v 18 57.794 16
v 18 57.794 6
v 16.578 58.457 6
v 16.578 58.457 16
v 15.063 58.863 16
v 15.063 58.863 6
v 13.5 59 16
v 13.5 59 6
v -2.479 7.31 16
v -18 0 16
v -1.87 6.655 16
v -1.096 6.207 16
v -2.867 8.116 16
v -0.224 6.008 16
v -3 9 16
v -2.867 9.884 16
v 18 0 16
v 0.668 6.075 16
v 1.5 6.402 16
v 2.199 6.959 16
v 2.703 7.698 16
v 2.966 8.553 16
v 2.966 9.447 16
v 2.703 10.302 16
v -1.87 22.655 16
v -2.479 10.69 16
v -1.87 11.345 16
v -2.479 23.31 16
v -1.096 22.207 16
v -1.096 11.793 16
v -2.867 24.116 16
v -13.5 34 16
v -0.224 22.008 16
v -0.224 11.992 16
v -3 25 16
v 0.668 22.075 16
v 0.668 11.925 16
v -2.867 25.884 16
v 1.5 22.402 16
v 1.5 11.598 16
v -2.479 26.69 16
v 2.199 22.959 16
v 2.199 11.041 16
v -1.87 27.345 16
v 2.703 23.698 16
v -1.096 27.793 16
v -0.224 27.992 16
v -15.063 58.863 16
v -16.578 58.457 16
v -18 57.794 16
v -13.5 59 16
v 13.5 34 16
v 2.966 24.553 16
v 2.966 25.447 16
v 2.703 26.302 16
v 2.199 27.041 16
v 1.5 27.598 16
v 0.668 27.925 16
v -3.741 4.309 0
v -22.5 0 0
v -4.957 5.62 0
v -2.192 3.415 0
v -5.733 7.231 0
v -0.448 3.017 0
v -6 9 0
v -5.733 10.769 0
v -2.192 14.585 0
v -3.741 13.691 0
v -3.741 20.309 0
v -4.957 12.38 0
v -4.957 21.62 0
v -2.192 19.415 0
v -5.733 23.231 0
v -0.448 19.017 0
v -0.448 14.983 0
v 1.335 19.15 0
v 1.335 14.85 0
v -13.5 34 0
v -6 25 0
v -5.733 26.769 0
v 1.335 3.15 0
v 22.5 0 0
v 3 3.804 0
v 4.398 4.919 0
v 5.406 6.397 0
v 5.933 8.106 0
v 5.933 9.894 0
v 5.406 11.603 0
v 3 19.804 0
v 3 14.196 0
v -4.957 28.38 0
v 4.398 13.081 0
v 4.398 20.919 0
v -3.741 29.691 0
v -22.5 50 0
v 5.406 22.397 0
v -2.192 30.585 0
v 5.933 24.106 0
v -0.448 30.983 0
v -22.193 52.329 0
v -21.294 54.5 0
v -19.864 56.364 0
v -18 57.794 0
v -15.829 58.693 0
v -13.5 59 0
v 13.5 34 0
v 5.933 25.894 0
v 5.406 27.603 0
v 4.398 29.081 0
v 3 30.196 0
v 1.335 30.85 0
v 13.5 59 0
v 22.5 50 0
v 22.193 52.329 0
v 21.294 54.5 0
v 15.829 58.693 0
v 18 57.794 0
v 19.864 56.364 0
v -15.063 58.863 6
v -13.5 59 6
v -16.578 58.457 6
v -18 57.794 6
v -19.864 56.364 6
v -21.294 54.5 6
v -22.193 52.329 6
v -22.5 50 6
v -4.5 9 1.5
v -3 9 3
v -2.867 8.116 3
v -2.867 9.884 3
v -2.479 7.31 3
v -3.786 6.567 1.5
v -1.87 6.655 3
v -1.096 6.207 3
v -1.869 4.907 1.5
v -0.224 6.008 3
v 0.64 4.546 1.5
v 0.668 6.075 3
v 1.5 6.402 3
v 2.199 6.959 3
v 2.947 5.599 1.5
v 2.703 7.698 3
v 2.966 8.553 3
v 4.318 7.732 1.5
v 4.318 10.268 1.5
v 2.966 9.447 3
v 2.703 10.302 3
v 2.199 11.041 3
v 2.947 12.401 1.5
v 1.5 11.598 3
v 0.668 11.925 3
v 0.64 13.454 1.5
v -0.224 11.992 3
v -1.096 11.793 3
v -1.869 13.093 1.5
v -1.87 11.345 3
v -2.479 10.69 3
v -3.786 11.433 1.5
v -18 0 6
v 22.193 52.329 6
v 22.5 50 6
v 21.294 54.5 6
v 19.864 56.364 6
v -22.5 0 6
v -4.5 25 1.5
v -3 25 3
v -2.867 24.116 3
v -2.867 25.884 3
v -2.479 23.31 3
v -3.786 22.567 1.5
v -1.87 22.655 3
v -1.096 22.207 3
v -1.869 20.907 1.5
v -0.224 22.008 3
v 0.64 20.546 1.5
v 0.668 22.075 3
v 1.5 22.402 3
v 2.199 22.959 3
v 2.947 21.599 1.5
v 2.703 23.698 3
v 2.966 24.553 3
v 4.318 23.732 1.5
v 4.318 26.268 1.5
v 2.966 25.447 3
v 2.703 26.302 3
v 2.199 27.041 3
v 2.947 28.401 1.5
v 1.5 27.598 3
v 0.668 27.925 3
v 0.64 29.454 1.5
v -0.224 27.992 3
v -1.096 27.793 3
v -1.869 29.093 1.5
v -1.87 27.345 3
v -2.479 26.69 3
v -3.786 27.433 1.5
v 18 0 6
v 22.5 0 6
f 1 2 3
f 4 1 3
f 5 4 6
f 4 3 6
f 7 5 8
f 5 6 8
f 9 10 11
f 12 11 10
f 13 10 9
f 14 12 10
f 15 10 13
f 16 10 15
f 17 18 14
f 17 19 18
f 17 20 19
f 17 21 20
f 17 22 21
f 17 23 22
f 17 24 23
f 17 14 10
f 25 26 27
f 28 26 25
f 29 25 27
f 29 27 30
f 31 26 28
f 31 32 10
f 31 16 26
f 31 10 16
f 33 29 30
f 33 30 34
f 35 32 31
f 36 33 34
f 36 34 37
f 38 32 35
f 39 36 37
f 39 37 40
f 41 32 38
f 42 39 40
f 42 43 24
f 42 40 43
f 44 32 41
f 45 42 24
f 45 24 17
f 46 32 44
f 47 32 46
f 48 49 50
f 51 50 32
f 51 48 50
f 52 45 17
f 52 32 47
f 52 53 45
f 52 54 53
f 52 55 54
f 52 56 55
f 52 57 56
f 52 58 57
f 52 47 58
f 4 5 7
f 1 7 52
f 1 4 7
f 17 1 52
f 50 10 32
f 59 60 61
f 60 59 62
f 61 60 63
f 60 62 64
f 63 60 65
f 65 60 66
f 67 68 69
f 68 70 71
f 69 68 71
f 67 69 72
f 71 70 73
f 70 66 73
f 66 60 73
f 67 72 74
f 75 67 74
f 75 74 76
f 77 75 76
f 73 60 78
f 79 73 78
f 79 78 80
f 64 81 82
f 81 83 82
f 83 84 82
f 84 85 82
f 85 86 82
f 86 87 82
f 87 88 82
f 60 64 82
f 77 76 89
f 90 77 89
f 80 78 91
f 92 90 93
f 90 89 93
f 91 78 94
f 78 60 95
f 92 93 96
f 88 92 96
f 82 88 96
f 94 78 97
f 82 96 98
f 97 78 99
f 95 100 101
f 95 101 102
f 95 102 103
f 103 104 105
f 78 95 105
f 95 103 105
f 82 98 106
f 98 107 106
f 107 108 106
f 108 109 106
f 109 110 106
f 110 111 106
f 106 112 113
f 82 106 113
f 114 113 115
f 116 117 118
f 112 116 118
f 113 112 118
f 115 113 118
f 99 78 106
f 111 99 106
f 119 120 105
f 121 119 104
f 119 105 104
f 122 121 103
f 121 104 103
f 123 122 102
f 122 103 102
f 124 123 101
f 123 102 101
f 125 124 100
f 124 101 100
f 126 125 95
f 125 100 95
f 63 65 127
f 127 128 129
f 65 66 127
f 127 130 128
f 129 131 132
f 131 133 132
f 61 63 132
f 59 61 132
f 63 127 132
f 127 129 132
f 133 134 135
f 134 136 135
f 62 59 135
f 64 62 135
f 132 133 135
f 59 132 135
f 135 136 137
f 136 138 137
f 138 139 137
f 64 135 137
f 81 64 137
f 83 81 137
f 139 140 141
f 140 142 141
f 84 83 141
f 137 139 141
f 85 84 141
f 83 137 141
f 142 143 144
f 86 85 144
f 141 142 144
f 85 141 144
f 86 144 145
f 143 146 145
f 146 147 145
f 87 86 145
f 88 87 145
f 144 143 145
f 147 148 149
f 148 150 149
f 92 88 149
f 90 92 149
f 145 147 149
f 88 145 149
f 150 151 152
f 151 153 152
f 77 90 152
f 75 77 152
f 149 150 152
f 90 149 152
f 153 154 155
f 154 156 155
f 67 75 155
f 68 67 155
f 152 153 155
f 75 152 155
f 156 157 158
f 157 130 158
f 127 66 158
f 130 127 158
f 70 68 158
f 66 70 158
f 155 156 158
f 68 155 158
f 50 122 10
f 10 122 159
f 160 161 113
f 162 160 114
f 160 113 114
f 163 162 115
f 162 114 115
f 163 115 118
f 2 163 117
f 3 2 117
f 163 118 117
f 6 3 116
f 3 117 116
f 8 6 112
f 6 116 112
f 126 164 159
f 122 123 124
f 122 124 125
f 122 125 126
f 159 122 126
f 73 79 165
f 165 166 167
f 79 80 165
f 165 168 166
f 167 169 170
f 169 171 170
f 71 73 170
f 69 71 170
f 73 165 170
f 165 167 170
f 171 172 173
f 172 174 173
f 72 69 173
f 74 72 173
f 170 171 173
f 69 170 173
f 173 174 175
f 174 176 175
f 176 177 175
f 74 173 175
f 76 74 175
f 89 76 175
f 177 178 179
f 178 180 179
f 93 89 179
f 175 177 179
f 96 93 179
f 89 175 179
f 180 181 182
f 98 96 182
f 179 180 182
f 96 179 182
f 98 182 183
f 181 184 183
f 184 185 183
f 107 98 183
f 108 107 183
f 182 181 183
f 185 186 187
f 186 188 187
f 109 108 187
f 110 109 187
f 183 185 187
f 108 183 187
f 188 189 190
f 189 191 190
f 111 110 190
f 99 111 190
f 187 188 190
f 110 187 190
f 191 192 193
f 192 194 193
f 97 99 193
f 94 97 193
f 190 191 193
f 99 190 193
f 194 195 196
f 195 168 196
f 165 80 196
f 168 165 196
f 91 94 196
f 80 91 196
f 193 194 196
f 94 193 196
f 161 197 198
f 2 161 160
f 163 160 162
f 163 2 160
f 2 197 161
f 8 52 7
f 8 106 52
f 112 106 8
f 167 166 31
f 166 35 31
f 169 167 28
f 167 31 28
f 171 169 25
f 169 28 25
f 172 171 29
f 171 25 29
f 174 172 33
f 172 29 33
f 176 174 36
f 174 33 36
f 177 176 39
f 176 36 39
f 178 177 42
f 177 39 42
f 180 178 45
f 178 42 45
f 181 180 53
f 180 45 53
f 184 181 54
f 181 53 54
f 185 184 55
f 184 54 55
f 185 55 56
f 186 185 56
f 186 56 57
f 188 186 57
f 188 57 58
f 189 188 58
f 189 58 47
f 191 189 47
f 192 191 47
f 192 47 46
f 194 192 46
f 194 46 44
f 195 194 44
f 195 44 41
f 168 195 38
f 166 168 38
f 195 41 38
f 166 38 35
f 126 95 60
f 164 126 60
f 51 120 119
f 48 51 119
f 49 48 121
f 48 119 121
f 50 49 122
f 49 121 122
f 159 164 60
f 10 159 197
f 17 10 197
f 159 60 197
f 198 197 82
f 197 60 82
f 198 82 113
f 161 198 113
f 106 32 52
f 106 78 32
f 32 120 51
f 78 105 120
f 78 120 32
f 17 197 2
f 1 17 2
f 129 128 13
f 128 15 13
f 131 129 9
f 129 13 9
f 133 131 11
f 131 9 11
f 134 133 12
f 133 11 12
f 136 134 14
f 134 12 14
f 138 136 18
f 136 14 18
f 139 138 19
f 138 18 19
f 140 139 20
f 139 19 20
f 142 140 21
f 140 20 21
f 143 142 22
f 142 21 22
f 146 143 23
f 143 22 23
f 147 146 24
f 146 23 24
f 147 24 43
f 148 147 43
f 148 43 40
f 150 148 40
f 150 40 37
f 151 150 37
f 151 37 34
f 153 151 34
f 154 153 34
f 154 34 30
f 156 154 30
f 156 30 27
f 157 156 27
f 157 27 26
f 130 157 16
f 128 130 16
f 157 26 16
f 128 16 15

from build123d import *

# Parameters (mm, degrees)
PAD_DEPTH           = 6
PAD001_DEPTH        = 10
HOLE_D              = 6
HOLE_DEPTH          = 25
HOLE_CSINK_D        = 12
HOLE_CSINK_ANGLE    = 90
LINEARPATTERN_COUNT = 2
LINEARPATTERN_PITCH = 16


with BuildPart() as part:
    # Sketch → Pad (new body)
    with BuildSketch(Plane.XY):
        with BuildLine():
            Line((-22.5, 0), (22.5, 0))
            Line((22.5, 0), (22.5, 50))
            ThreePointArc((22.5, 50), (19.863961, 56.363961), (13.5, 59))
            Line((13.5, 59), (13.5, 34))
            Line((13.5, 34), (-13.5, 34))
            Line((-13.5, 34), (-13.5, 59))
            ThreePointArc((-13.5, 59), (-19.863961, 56.363961), (-22.5, 50))
            Line((-22.5, 50), (-22.5, 0))
        make_face()
    extrude(amount=PAD_DEPTH)

    # Sketch001 (on Face10 of Pad) → Pad001 (join)
    with BuildSketch(Plane.XY.offset(6)):
        with BuildLine():
            Line((-18, 0), (18, 0))
            Line((18, 0), (18, 34))
            Line((18, 57.794229), (18, 34))
            ThreePointArc((18, 57.794229), (15.829371, 58.693332), (13.5, 59))
            Line((13.5, 34), (13.5, 59))
            Line((-13.5, 34), (13.5, 34))
            Line((-13.5, 59), (-13.5, 34))
            ThreePointArc((-13.5, 59), (-15.829371, 58.693332), (-18, 57.794229))
            Line((-18, 57.794229), (-18, 34))
            Line((-18, 34), (-18, 0))
        make_face()
    extrude(amount=PAD001_DEPTH)

    # Hole
    with Locations(Plane(origin=(0, 0, 0), x_dir=(1, 0, 0), z_dir=(0, 0, -1))):
        with Locations((0, -9)):
            hole = CounterSinkHole(HOLE_D / 2, HOLE_CSINK_D / 2, depth=HOLE_DEPTH, counter_sink_angle=HOLE_CSINK_ANGLE)

    # LinearPattern: Hole ×2
    with Locations(*[(0, i * LINEARPATTERN_PITCH, 0) for i in range(1, LINEARPATTERN_COUNT)]):
        add(hole, mode=Mode.SUBTRACT)


solid = part.part
